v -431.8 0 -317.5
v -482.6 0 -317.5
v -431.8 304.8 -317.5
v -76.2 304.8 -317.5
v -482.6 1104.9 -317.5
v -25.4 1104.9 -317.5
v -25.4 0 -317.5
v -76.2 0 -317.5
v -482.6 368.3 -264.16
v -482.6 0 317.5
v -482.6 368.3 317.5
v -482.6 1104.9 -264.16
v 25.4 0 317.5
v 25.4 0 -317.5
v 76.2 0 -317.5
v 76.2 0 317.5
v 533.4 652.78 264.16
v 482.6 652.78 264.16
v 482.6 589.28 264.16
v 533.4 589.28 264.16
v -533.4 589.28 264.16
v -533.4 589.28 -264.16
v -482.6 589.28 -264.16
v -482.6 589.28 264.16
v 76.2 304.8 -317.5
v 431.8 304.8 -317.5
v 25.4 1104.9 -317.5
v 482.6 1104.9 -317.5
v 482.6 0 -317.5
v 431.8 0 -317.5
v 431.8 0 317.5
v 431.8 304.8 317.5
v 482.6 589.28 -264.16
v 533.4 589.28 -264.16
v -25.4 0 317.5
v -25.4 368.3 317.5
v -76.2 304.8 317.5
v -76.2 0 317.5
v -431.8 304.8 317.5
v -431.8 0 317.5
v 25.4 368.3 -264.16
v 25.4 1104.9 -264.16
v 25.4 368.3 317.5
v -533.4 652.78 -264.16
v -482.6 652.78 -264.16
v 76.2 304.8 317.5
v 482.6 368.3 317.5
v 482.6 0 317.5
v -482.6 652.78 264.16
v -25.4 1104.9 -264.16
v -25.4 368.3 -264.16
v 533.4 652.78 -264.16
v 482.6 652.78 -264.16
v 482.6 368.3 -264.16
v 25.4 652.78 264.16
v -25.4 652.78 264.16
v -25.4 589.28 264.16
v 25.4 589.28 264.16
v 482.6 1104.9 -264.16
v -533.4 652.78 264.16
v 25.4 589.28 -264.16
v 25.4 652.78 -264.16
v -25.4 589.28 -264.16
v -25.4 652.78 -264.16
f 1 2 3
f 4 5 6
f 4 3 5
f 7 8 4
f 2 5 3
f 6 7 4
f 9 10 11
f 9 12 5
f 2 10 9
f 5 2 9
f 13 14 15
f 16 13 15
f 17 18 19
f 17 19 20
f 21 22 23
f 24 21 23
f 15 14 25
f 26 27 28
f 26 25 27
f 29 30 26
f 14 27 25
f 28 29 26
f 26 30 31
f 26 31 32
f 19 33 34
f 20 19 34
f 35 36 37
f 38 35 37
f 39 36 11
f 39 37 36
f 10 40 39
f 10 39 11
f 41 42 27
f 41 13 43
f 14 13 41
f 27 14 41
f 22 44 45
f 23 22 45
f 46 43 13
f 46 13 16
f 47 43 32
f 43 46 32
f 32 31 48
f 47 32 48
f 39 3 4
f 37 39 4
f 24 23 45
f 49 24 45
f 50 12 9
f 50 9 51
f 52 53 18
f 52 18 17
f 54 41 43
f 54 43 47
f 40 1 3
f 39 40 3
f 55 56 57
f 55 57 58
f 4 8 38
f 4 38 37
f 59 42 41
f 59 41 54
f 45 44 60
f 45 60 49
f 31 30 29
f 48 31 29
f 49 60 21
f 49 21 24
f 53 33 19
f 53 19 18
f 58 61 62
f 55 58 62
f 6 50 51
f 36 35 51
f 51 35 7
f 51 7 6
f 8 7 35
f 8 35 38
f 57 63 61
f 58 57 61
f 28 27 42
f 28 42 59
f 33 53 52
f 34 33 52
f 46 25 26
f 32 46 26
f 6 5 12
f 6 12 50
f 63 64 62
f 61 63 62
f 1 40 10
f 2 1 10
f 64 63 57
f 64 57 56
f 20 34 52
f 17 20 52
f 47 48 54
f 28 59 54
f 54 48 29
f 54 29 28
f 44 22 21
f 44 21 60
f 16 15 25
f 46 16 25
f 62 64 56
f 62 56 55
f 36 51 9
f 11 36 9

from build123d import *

# Parameters (mm, degrees)
BOSS_EXTRUDE1_DEPTH     = 368.3
BOSS_EXTRUDE1_2_DEPTH   = 368.3
SKETCH2_W               = 457.2
SKETCH2_H               = 53.34
BOSS_EXTRUDE2_DEPTH     = 736.6
SKETCH3_W               = 50.8
SKETCH3_H               = 63.5
BOSS_EXTRUDE3_DEPTH     = 528.32
BOSS_EXTRUDE3_2_DEPTH   = 528.32
BOSS_EXTRUDE3_3_DEPTH   = 528.32
CUT_EXTRUDE1_DEPTH      = 1382.500839667
CUT_EXTRUDE1_DEPTH_BACK = 1382.500839667
SKETCH4_W               = 355.6
SKETCH4_H               = 304.8
SKETCH4_W_2             = 50.8
SKETCH4_H_2             = 368.3


with BuildPart() as part:
    # Sketch1 → Boss-Extrude1 (new body)
    with BuildSketch(Plane(origin=(0, 0, 0), x_dir=(1, 0, 0), z_dir=(0, 1, 0))):
        Polygon((-533.4, 264.16), (-482.6, 264.16), (-482.6, 317.5), (-25.4, 317.5), (-25.4, -317.5), (-482.6, -317.5), (-482.6, -264.16), (-533.4, -264.16), align=None)
    extrude(amount=BOSS_EXTRUDE1_DEPTH)



with BuildPart() as body_2:
    # Sketch1 → Boss-Extrude1 2 (new body)
    with BuildSketch(Plane(origin=(0, 0, 0), x_dir=(1, 0, 0), z_dir=(0, 1, 0))):
        Polygon((25.4, -317.5), (482.6, -317.5), (482.6, -264.16), (533.4, -264.16), (533.4, 264.16), (482.6, 264.16), (482.6, 317.5), (25.4, 317.5), align=None)
    extrude(amount=BOSS_EXTRUDE1_2_DEPTH)


with BuildPart() as part_1:
    add(part.part)

    add(body_2.part)  # Boss-Extrude2 merges body 2
    # Sketch2 → Boss-Extrude2 (add)
    with BuildSketch(Plane(origin=(0, 368.3, 0), x_dir=(1, 0, 0), z_dir=(0, 1, 0))):
        with Locations((-254, 290.83)):
            Rectangle(SKETCH2_W, SKETCH2_H)
        with Locations((254, 290.83)):
            Rectangle(SKETCH2_W, SKETCH2_H)
    extrude(amount=BOSS_EXTRUDE2_DEPTH)

    # Sketch4 → Cut-Extrude1 (cut, two sides: drawn at the far end of the back side and taken through both)
    with BuildSketch(Plane.XY.offset(317.5).offset(-CUT_EXTRUDE1_DEPTH_BACK)):
        with Locations((-254, 152.4)):
            Rectangle(SKETCH4_W, SKETCH4_H)
        with Locations((-508, 184.15)):
            Rectangle(SKETCH4_W_2, SKETCH4_H_2)
        with Locations((254, 152.4)):
            Rectangle(SKETCH4_W, SKETCH4_H)
        with Locations((508, 184.15)):
            Rectangle(SKETCH4_W_2, SKETCH4_H_2)
    extrude(amount=CUT_EXTRUDE1_DEPTH + CUT_EXTRUDE1_DEPTH_BACK, mode=Mode.SUBTRACT)


with BuildPart() as body_2_2:
    # Sketch3 → Boss-Extrude3 (new body)
    with BuildSketch(Plane.XY.offset(-264.16)):
        with Locations((-508, 621.03)):
            Rectangle(SKETCH3_W, SKETCH3_H)
    extrude(amount=BOSS_EXTRUDE3_DEPTH)


with BuildPart() as body_3:
    # Sketch3 → Boss-Extrude3 2 (new body)
    with BuildSketch(Plane.XY.offset(-264.16)):
        with Locations((508, 621.03)):
            Rectangle(SKETCH3_W, SKETCH3_H)
    extrude(amount=BOSS_EXTRUDE3_2_DEPTH)


with BuildPart() as body_4:
    # Sketch3 → Boss-Extrude3 3 (new body)
    with BuildSketch(Plane.XY.offset(-264.16)):
        with Locations((0, 621.03)):
            Rectangle(SKETCH3_W, SKETCH3_H)
    extrude(amount=BOSS_EXTRUDE3_3_DEPTH)


solid = Compound([part_1.part, body_2_2.part, body_3.part, body_4.part])
